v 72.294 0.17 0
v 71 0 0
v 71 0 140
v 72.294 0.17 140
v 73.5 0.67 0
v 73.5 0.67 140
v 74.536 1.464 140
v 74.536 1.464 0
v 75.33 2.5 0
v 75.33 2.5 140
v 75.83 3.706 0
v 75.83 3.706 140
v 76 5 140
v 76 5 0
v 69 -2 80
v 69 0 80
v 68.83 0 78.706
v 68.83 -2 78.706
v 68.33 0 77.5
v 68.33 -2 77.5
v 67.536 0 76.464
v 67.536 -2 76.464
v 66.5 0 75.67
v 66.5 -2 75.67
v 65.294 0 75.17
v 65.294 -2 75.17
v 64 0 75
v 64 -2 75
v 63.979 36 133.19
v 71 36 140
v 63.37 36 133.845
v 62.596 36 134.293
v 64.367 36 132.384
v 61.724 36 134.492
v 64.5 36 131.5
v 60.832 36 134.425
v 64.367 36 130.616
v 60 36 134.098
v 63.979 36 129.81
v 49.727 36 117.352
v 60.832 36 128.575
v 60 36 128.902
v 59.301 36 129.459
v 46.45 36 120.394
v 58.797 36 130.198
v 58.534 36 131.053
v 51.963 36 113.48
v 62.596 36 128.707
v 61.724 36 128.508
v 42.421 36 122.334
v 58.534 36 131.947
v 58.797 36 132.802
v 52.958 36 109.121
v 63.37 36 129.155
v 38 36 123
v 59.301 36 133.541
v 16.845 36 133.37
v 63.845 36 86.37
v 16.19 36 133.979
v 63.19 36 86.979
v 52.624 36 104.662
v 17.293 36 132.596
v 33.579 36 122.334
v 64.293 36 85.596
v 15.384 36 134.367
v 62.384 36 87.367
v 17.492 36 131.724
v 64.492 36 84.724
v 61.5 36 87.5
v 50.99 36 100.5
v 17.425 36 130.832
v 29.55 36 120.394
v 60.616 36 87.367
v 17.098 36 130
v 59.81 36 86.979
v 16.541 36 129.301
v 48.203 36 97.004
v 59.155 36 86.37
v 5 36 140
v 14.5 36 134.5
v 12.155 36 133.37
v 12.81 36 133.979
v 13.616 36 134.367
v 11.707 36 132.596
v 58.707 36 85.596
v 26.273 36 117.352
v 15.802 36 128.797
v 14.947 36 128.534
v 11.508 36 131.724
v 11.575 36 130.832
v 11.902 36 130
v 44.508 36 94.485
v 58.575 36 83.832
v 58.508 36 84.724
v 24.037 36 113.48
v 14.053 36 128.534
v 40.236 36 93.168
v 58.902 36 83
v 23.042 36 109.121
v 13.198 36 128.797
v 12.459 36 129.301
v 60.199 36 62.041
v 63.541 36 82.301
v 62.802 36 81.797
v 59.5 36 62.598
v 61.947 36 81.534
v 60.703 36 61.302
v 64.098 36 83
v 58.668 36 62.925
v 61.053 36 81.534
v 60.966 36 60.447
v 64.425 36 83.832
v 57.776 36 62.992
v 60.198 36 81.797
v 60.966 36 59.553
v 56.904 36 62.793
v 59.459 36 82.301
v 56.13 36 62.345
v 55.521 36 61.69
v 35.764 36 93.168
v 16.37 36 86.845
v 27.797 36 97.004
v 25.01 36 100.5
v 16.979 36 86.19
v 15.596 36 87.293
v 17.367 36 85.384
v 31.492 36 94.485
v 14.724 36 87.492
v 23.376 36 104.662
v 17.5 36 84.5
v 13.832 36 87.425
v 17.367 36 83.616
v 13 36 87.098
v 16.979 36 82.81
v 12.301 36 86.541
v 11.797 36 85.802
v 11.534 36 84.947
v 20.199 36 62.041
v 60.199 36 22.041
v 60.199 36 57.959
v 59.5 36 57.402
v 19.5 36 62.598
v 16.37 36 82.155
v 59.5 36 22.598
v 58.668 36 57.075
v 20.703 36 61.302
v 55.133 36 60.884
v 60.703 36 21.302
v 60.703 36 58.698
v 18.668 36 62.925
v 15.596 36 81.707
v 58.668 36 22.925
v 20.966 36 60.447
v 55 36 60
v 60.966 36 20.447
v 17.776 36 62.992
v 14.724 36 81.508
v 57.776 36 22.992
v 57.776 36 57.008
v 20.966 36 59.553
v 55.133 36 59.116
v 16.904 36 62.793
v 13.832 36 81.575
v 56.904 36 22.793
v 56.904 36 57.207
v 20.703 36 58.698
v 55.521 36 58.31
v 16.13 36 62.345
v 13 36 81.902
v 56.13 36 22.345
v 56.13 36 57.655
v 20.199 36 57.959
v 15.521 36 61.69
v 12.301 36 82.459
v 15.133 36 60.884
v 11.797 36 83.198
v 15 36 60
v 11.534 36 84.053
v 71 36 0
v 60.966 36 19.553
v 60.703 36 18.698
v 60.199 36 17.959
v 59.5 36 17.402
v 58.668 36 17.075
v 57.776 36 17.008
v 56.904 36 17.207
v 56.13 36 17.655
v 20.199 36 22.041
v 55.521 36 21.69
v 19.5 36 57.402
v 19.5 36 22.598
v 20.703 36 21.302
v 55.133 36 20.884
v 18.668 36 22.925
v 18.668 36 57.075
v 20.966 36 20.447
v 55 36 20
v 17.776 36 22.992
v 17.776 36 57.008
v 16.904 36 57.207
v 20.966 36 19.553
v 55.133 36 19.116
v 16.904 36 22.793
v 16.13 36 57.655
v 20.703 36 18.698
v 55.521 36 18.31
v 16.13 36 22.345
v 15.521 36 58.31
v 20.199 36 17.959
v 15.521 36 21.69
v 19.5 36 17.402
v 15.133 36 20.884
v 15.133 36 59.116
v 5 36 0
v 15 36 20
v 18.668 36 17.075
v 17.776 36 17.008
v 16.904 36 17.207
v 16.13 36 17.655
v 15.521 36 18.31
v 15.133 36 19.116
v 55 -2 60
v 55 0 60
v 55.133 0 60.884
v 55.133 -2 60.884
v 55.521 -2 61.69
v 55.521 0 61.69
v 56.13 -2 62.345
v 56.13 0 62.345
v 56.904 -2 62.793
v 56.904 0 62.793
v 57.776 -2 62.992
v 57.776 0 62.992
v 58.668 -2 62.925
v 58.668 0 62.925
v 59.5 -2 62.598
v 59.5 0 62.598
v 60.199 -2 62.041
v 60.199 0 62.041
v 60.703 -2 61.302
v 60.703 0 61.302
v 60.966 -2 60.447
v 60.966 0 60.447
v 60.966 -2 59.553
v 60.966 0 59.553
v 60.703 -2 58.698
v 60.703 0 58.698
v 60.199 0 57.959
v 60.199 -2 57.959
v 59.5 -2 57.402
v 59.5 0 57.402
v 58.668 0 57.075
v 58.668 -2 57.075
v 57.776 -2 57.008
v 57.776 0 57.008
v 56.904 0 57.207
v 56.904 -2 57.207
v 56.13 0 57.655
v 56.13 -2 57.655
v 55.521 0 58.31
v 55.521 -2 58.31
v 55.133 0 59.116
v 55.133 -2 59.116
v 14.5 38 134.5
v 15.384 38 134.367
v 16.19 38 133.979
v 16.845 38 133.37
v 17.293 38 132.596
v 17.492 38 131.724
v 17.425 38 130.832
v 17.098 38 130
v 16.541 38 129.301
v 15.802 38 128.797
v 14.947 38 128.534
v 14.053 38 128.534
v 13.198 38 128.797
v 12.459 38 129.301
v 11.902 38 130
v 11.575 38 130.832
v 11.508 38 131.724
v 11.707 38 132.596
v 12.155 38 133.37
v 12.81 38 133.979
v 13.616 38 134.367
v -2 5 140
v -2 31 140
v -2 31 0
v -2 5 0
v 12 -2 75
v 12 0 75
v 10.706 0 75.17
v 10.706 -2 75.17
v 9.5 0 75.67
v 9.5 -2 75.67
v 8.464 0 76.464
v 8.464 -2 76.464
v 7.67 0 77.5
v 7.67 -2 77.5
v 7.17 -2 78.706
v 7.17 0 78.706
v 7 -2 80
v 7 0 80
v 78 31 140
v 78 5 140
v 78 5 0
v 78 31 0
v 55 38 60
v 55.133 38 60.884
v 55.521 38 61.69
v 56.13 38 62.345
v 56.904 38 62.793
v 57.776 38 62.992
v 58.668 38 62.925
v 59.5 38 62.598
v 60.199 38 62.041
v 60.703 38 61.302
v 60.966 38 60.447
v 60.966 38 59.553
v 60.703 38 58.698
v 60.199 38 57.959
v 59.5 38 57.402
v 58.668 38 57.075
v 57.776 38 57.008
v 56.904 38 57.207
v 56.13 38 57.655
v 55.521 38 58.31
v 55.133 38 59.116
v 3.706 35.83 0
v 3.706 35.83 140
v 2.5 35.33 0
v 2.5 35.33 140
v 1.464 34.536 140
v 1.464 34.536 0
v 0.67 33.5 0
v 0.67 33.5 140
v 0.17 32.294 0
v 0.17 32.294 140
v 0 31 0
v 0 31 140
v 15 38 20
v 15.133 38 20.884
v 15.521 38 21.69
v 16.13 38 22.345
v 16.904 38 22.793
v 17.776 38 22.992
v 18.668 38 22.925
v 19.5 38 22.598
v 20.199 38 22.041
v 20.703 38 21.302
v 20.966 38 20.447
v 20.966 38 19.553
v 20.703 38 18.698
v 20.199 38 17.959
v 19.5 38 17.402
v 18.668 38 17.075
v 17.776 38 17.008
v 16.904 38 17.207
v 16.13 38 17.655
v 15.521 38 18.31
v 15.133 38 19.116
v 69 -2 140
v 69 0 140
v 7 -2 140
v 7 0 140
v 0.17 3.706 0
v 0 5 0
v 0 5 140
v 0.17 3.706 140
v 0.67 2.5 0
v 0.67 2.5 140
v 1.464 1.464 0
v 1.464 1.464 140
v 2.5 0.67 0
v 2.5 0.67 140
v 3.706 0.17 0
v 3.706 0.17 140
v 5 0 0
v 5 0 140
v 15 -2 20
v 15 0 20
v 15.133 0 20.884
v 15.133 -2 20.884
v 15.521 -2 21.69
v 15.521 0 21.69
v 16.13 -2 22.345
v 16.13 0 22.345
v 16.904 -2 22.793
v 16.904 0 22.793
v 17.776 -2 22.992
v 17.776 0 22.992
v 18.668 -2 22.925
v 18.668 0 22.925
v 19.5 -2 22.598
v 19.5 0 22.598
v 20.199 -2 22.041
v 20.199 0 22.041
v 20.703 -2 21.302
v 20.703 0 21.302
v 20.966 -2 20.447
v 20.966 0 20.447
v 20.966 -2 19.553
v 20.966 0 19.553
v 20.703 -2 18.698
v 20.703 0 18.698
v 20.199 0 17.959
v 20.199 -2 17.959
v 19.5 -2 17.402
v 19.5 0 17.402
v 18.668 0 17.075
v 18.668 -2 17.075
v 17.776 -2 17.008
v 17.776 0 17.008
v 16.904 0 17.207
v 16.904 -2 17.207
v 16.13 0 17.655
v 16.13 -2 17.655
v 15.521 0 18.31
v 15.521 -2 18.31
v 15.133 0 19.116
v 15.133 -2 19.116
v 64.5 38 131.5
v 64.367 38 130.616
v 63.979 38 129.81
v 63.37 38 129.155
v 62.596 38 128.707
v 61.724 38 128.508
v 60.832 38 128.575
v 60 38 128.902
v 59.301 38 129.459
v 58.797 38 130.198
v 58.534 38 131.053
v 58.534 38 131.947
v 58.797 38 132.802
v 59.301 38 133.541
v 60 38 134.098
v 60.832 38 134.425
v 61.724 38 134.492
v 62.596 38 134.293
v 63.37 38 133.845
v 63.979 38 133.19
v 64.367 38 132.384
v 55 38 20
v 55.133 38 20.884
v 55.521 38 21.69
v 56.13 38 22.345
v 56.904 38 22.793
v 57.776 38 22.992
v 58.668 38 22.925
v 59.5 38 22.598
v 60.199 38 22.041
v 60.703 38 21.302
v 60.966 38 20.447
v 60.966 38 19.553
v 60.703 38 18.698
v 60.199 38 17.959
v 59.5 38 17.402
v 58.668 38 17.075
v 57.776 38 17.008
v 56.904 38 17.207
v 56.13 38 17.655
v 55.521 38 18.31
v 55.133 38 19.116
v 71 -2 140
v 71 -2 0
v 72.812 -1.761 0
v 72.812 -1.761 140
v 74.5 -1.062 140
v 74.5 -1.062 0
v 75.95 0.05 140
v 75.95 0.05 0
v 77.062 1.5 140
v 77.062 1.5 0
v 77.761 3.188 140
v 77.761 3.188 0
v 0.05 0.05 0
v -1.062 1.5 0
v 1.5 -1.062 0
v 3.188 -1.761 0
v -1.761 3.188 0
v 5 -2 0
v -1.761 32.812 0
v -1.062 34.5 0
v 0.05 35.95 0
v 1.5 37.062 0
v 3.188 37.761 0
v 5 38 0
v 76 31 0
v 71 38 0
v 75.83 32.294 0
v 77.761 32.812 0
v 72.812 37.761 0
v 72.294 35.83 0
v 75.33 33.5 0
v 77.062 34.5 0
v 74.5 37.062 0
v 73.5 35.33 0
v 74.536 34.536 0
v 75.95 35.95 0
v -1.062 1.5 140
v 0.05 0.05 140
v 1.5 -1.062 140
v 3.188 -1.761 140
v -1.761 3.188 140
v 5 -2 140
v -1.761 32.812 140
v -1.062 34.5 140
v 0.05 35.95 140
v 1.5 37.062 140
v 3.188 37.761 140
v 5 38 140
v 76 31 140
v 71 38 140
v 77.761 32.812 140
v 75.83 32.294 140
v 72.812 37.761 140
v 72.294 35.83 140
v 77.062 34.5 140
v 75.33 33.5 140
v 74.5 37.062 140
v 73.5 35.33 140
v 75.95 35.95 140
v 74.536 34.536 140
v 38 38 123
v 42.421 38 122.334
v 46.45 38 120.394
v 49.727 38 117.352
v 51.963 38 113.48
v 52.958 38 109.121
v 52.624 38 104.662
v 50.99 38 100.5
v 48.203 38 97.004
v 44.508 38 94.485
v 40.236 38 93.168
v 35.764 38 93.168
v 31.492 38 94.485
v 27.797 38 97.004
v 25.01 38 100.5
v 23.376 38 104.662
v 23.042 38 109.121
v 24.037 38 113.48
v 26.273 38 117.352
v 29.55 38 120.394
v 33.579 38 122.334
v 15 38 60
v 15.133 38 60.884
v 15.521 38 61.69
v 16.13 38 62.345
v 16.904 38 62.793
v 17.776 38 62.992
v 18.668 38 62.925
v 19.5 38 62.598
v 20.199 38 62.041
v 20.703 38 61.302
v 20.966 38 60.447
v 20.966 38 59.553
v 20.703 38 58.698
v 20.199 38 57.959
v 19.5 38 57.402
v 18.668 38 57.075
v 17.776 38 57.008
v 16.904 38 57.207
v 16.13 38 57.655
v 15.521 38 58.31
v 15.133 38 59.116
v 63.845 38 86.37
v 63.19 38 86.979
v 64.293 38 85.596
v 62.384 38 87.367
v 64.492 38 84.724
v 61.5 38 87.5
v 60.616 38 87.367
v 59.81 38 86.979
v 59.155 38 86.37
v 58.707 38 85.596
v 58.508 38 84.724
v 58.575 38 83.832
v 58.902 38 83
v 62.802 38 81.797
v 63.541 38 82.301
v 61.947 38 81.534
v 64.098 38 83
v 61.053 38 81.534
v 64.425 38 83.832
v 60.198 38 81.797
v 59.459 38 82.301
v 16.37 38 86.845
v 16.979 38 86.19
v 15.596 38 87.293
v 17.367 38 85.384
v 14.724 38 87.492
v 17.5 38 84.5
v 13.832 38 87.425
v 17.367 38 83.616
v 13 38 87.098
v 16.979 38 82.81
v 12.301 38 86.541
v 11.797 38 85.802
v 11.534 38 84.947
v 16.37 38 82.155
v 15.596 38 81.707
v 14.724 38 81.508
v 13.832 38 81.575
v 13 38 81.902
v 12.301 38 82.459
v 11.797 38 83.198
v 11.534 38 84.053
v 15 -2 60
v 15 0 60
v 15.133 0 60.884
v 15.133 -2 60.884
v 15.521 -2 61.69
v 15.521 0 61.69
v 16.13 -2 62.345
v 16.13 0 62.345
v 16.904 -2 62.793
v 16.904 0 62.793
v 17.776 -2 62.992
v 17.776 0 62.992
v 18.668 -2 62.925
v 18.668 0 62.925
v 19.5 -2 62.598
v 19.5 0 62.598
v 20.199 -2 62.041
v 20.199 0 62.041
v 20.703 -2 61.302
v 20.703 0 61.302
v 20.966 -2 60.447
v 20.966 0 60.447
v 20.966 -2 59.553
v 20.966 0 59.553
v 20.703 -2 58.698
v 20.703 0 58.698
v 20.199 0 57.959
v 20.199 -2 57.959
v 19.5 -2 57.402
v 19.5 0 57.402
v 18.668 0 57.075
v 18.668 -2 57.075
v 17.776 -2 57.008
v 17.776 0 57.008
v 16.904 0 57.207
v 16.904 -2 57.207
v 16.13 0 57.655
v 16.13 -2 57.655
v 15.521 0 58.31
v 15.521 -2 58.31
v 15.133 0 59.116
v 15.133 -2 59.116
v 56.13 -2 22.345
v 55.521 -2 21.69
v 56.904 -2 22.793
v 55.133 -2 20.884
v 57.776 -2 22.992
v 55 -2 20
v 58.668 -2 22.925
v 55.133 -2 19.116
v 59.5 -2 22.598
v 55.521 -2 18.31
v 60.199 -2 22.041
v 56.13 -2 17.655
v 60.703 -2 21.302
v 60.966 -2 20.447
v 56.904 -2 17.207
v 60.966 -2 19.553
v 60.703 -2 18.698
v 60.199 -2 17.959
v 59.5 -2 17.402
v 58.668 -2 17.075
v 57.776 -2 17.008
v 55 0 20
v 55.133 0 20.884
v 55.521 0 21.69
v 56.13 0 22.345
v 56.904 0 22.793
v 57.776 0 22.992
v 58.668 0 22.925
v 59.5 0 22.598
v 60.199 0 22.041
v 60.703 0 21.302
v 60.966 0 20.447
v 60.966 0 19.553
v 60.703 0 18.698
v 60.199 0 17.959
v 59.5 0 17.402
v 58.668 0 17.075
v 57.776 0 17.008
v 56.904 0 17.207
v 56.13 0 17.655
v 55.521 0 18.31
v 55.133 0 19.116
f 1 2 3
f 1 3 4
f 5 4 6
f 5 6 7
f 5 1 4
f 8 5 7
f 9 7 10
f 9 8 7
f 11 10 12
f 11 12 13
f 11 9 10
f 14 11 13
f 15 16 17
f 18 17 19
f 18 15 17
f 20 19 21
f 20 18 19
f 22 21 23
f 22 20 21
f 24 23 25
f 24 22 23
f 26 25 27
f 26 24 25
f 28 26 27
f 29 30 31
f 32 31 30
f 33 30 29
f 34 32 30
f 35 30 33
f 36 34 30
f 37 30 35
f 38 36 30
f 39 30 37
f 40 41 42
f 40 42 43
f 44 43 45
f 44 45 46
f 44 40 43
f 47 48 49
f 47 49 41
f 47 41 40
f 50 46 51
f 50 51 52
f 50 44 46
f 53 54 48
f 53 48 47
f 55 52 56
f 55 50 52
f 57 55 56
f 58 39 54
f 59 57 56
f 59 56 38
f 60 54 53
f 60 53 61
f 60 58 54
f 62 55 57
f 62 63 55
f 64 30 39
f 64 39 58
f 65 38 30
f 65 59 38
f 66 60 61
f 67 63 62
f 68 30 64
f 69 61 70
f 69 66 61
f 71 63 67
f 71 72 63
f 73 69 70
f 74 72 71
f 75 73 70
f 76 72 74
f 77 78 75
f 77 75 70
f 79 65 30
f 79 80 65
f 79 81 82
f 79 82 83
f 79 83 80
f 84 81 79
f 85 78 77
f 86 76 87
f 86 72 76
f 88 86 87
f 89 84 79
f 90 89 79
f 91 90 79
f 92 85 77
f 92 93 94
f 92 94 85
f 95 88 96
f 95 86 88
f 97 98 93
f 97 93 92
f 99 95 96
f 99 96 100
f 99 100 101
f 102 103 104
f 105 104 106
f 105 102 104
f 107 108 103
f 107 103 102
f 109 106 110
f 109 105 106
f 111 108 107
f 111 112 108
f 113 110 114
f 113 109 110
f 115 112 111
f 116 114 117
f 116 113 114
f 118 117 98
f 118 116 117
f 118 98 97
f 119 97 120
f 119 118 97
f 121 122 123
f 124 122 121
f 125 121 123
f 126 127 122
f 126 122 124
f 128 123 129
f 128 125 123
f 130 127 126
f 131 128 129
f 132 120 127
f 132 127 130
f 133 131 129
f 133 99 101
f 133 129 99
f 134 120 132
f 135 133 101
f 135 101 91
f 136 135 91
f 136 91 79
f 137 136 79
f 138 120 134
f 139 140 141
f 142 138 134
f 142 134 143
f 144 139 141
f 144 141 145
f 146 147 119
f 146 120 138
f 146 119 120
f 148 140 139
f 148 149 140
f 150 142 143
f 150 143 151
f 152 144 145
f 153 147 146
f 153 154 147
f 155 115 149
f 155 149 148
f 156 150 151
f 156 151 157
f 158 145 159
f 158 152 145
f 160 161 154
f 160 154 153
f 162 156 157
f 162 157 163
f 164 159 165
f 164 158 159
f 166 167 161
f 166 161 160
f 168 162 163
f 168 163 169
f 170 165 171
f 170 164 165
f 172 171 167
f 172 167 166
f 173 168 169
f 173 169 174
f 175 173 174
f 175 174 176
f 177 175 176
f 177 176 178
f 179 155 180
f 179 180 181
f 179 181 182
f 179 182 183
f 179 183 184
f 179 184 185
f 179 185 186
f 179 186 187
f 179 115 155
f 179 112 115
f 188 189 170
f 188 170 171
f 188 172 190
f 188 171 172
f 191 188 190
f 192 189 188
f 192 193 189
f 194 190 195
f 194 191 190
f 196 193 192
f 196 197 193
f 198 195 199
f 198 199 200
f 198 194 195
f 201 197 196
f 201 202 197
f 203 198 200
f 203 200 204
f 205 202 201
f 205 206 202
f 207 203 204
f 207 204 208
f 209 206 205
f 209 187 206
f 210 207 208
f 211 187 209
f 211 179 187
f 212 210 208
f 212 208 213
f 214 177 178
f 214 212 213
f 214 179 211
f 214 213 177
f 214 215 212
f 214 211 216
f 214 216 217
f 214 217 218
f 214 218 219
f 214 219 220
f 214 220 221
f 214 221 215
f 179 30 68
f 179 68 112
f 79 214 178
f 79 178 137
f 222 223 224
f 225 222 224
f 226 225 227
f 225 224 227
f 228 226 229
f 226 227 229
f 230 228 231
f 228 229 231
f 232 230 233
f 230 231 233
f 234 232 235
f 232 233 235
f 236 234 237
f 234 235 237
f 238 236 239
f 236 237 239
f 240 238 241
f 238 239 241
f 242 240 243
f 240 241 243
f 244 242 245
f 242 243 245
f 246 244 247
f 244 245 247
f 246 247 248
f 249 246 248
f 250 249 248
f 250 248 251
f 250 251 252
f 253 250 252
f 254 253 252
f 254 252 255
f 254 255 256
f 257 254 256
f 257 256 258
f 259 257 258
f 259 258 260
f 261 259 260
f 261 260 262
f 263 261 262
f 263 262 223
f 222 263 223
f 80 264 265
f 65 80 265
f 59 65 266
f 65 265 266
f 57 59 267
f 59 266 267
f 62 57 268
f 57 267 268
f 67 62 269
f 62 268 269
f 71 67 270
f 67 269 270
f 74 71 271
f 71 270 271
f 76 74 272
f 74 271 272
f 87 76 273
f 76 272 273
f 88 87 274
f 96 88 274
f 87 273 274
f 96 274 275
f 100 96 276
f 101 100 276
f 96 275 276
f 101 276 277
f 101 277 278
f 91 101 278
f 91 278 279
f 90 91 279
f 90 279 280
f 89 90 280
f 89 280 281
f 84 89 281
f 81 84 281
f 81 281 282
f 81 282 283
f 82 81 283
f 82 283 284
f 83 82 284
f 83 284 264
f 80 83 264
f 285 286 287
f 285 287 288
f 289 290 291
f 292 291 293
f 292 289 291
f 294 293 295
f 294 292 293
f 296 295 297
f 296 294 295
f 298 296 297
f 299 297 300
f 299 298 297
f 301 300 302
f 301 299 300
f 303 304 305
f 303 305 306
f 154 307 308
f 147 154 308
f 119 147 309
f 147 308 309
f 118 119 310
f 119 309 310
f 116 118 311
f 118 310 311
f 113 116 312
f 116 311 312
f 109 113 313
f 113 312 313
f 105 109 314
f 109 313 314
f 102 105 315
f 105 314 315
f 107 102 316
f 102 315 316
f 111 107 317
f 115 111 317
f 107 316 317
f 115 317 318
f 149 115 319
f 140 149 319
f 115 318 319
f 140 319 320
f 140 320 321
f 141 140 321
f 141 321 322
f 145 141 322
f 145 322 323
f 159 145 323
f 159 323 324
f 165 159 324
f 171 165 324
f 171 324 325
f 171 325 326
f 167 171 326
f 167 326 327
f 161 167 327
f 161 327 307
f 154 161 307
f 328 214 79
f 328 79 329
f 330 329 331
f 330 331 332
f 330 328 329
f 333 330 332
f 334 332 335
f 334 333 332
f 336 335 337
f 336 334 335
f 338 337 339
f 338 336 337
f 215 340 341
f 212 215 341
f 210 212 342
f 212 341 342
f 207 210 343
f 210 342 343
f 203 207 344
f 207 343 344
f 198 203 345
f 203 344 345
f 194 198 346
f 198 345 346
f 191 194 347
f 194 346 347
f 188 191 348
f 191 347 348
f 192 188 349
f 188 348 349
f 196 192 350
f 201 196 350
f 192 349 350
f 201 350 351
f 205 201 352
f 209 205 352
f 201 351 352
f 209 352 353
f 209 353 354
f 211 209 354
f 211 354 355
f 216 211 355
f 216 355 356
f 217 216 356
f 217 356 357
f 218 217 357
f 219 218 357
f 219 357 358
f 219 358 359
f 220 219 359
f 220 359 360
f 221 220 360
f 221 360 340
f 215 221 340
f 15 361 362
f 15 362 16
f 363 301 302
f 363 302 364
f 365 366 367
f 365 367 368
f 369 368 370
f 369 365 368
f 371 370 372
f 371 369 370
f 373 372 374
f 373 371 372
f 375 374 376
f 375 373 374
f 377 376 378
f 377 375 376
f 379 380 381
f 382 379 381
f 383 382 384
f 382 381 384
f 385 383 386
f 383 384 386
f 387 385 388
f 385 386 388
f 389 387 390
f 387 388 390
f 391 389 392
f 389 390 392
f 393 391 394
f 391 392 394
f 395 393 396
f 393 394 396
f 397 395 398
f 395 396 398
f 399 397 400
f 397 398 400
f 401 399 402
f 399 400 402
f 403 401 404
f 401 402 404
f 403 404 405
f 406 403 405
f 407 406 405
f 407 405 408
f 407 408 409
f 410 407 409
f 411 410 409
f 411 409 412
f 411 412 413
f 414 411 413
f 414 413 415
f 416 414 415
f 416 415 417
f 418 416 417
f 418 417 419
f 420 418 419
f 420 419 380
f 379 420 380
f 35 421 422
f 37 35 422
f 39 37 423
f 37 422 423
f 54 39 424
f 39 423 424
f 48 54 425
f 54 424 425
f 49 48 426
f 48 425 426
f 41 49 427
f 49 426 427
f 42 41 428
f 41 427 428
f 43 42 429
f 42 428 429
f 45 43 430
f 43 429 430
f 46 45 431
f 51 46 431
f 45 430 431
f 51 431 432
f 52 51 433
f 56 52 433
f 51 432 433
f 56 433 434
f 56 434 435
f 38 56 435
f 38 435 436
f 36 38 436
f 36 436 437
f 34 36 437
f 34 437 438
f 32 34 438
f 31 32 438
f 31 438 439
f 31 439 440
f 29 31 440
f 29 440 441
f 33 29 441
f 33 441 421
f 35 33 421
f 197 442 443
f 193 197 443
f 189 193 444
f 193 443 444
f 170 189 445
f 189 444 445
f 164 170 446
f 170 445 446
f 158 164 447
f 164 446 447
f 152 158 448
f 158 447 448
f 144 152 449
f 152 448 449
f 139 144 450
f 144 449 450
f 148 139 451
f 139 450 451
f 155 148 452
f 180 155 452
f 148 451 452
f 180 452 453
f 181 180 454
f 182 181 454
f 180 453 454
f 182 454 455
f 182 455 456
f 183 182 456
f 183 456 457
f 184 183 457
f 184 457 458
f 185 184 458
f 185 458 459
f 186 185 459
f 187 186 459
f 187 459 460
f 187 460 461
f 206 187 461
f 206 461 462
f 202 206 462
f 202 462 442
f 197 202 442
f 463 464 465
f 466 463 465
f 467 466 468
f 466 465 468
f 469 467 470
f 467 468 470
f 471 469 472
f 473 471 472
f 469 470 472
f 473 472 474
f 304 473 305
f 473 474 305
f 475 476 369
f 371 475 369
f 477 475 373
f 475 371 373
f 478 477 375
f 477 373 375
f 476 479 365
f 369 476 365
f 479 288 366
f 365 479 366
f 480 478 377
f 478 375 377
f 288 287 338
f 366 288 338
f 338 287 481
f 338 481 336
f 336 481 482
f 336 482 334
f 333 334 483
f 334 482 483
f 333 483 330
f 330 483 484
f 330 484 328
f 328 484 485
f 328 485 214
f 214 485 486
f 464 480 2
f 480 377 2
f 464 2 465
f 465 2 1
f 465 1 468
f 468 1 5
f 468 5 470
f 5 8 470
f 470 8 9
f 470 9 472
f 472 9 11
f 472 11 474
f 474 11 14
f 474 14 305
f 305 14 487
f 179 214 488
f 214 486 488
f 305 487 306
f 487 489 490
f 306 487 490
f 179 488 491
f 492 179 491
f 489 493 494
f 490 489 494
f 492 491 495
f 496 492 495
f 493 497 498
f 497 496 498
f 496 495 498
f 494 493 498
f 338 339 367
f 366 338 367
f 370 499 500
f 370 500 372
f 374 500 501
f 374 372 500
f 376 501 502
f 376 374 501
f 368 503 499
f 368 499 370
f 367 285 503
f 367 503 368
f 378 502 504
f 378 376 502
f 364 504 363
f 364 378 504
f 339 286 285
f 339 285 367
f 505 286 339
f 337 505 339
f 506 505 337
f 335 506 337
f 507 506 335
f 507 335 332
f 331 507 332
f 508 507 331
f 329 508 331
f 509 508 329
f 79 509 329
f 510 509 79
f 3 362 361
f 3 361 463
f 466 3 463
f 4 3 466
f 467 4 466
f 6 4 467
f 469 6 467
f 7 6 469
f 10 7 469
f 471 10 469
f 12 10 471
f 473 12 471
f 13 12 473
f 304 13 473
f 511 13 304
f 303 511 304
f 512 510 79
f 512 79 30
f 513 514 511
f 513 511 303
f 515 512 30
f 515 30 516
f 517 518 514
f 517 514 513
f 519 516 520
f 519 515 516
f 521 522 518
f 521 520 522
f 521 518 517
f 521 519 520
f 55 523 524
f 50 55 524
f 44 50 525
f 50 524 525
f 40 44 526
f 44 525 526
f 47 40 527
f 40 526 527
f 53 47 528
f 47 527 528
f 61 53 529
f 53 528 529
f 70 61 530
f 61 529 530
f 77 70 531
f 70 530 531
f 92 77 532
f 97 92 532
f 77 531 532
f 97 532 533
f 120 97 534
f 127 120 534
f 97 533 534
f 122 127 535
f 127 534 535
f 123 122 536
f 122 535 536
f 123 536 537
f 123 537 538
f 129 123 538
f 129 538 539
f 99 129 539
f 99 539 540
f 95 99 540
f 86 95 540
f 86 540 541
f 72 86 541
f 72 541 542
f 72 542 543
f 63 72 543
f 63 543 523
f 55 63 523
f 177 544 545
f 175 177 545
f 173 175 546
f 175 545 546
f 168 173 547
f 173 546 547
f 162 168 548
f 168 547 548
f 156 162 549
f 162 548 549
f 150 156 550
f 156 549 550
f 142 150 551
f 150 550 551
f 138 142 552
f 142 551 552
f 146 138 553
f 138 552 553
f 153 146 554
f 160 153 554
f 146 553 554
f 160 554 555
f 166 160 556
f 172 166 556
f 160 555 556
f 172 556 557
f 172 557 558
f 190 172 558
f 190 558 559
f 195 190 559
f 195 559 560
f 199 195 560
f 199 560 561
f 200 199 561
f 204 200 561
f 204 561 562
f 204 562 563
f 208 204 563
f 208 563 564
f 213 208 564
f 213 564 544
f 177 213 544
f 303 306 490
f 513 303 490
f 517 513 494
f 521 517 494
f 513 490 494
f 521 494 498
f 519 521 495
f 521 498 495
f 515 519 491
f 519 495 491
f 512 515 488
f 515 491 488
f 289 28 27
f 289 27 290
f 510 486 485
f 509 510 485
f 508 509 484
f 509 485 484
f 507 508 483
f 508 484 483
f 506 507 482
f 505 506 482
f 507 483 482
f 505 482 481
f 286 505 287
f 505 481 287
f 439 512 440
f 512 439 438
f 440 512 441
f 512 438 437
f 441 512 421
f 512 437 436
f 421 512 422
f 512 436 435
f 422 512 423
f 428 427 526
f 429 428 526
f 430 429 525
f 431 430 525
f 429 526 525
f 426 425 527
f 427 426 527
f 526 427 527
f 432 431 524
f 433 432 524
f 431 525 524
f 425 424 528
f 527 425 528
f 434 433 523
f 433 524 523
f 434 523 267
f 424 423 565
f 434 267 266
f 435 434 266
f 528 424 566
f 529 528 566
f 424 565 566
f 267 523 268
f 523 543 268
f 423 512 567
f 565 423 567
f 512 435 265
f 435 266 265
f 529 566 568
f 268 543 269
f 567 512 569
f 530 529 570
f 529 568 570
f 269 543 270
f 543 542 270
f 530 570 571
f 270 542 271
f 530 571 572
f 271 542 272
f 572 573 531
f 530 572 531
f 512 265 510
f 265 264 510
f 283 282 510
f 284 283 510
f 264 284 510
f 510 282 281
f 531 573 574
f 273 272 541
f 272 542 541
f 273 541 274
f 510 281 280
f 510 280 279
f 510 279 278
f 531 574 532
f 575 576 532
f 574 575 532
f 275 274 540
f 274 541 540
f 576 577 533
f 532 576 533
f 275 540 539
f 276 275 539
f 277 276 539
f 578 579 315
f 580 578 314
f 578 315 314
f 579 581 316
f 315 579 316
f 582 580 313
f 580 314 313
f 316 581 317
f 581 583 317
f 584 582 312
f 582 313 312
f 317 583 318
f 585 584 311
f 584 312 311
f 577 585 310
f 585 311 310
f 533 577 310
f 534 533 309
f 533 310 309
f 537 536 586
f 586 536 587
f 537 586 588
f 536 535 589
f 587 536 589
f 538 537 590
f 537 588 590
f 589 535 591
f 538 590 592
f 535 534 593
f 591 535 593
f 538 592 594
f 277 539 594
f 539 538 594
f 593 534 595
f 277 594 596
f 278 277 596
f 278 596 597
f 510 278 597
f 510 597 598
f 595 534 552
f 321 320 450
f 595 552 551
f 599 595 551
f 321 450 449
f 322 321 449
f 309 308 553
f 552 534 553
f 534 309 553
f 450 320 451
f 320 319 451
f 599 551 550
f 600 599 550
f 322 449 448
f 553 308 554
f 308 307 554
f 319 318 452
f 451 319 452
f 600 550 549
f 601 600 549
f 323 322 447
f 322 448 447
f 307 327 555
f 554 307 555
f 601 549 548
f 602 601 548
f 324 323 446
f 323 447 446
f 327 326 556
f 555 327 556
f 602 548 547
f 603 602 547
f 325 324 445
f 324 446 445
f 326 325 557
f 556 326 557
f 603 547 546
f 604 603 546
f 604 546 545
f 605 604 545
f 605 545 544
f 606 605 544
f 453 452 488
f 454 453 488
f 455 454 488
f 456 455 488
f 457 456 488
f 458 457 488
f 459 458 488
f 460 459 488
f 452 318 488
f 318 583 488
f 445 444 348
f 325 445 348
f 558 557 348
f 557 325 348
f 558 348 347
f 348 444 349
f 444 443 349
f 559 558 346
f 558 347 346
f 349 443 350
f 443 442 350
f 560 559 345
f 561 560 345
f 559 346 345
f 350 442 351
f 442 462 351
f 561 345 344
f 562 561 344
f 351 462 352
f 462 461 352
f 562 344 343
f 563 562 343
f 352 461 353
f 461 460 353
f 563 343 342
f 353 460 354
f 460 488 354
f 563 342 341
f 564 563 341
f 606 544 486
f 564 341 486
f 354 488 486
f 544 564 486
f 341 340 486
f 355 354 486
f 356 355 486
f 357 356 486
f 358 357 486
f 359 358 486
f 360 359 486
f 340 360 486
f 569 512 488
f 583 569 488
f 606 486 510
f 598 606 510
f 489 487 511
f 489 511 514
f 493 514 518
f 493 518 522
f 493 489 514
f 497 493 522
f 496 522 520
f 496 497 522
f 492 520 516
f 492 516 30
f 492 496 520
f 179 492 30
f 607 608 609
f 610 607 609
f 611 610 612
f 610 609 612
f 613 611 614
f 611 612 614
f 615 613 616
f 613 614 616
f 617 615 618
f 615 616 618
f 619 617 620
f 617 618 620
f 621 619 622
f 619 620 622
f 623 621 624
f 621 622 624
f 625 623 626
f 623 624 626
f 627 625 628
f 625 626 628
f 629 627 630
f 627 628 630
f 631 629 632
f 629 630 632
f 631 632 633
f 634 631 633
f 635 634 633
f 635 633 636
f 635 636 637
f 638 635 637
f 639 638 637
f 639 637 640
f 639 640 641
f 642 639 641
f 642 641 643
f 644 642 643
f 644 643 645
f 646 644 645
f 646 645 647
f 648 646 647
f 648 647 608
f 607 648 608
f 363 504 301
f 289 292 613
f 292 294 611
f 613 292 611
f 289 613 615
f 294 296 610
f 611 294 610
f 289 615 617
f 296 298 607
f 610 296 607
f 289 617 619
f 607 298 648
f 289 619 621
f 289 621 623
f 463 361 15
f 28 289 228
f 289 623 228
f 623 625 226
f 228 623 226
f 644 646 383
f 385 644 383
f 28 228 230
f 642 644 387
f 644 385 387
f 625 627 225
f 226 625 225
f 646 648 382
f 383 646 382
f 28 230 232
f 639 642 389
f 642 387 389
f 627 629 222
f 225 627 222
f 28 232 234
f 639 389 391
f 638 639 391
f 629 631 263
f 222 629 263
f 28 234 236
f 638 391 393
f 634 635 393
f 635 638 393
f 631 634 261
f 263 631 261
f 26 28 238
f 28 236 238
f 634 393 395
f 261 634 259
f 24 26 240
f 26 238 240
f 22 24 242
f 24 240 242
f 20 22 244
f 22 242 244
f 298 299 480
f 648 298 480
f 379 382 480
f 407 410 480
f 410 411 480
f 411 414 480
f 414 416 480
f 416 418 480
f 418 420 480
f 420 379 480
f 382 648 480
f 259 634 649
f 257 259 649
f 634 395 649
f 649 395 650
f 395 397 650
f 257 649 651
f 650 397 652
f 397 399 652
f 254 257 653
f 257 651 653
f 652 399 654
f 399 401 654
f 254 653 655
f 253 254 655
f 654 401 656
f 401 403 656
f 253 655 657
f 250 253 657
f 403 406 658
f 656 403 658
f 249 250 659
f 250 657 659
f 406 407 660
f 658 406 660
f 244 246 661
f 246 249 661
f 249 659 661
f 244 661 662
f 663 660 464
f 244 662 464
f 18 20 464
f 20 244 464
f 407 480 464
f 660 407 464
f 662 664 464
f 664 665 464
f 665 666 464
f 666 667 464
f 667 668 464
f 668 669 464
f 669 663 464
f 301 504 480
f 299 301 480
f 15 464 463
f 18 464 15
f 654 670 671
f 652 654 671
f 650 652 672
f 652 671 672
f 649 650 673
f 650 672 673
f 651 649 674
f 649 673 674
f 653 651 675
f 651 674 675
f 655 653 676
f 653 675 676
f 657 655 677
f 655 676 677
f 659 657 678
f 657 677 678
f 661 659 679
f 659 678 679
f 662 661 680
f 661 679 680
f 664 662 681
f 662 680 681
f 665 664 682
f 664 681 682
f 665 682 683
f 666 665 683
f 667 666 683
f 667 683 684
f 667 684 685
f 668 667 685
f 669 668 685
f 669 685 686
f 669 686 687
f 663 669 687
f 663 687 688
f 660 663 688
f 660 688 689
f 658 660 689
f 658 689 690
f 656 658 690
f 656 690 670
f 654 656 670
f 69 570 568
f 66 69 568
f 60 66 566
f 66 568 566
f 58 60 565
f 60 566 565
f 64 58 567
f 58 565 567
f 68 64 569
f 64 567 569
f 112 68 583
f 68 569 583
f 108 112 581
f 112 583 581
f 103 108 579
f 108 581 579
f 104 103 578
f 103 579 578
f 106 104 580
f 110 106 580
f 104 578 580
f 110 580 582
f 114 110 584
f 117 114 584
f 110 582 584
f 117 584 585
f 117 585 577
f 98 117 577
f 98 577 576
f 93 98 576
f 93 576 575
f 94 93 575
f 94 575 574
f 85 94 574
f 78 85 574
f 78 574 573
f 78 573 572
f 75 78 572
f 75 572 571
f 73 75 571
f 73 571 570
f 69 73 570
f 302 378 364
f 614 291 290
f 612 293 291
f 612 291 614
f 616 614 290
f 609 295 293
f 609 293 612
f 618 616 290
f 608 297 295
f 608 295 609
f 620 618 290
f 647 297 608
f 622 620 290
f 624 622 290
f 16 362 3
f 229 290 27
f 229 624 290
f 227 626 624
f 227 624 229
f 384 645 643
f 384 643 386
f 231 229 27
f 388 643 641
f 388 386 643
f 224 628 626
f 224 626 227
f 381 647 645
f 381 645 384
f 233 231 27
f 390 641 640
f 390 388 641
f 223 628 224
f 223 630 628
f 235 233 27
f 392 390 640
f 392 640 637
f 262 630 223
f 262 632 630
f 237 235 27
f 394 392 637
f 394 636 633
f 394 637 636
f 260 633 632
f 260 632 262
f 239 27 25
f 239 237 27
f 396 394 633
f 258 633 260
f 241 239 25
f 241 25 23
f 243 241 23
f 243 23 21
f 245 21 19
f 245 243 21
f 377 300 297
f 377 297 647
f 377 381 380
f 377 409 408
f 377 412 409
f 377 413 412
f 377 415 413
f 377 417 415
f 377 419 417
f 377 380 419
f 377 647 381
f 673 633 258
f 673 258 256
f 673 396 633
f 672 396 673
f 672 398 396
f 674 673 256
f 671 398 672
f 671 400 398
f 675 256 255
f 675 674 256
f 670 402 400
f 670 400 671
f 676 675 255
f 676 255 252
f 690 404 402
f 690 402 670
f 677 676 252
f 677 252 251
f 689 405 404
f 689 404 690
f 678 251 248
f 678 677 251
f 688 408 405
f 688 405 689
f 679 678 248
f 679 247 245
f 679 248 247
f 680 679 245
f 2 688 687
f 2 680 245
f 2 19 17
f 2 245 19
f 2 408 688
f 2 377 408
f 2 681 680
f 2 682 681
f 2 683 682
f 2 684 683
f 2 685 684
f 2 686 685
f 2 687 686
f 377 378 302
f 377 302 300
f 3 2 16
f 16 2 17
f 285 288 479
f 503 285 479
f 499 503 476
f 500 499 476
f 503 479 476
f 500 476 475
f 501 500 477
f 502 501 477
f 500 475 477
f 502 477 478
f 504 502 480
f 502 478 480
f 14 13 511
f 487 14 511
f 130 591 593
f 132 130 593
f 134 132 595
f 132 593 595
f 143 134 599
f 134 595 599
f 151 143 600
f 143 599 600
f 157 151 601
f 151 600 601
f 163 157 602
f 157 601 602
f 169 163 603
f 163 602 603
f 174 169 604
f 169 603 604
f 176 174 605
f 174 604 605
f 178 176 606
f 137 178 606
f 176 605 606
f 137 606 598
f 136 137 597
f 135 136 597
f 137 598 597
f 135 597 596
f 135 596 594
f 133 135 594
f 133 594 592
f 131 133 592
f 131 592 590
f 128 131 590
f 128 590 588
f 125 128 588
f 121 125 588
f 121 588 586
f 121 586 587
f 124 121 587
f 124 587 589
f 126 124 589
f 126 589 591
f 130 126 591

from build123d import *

# Parameters (mm, degrees)
AUFSATZ_LINEAR_AUSTRAGEN1_DEPTH = 140
SKIZZE2_R                       = 15
SCHNITT_LINEAR_AUSTRAGEN1_DEPTH = 10
SCHNITT_LINEAR_AUSTRAGEN2_DEPTH = 10
SKIZZE4_R                       = 3
SCHNITT_LINEAR_AUSTRAGEN3_DEPTH = 10
SKIZZE5_R                       = 3
SCHNITT_LINEAR_AUSTRAGEN4_DEPTH = 60


with BuildPart() as part:
    # Skizze1 → Aufsatz-Linear austragen1 (new body)
    with BuildSketch(Plane.XY):
        with BuildLine():
            Line((78, 5), (78, 31))
            ThreePointArc((78, 31), (75.949747468, 35.949747468), (71, 38))
            Line((71, 38), (5, 38))
            ThreePointArc((5, 38), (0.050252532, 35.949747468), (-2, 31))
            Line((-2, 31), (-2, 5))
            ThreePointArc((-2, 5), (0.050252532, 0.050252532), (5, -2))
            Line((5, -2), (71, -2))
            ThreePointArc((71, -2), (75.949747468, 0.050252532), (78, 5))
        make_face()
        with BuildLine():
            Line((0, 31), (0, 5))
            ThreePointArc((0, 5), (1.464466094, 1.464466094), (5, 0))
            Line((5, 0), (71, 0))
            ThreePointArc((71, 0), (74.535533906, 1.464466094), (76, 5))
            Line((76, 5), (76, 31))
            ThreePointArc((76, 31), (74.535533906, 34.535533906), (71, 36))
            Line((71, 36), (5, 36))
            ThreePointArc((5, 36), (1.464466094, 34.535533906), (0, 31))
        make_face(mode=Mode.SUBTRACT)
    extrude(amount=AUFSATZ_LINEAR_AUSTRAGEN1_DEPTH)

    # Skizze2 → Schnitt-Linear austragen1 (cut)
    with BuildSketch(Plane(origin=(0, 38, 0), x_dir=(-1, 0, 0), z_dir=(0, 1, 0))):
        with Locations(Location((-38, 108, 0), (0, 0, 90))):
            Circle(SKIZZE2_R)
    extrude(amount=-SCHNITT_LINEAR_AUSTRAGEN1_DEPTH, mode=Mode.SUBTRACT)

    # Skizze3 → Schnitt-Linear austragen2 (cut)
    with BuildSketch(Plane.XZ.offset(2)):
        with BuildLine():
            Line((7, 140), (69, 140))
            Line((69, 140), (69, 80))
            ThreePointArc((69, 80), (67.535533906, 76.464466094), (64, 75))
            Line((64, 75), (12, 75))
            ThreePointArc((12, 75), (8.464466094, 76.464466094), (7, 80))
            Line((7, 80), (7, 140))
        make_face()
    extrude(amount=-SCHNITT_LINEAR_AUSTRAGEN2_DEPTH, mode=Mode.SUBTRACT)

    # Skizze4 → Schnitt-Linear austragen3 (cut)
    with BuildSketch(Plane(origin=(0, 38, 0), x_dir=(1, 0, 0), z_dir=(0, 1, 0))):
        with Locations(Location((61.5, -84.5, 0), (0, 0, 270))):
            Circle(SKIZZE4_R)
        with Locations((14.5, -84.5)):
            Circle(SKIZZE4_R)
        with Locations(Location((14.5, -131.5, 0), (0, 0, 270))):
            Circle(SKIZZE4_R)
        with Locations((61.5, -131.5)):
            Circle(SKIZZE4_R)
    extrude(amount=-SCHNITT_LINEAR_AUSTRAGEN3_DEPTH, mode=Mode.SUBTRACT)

    # Skizze5 → Schnitt-Linear austragen4 (cut)
    with BuildSketch(Plane(origin=(0, 38, 0), x_dir=(1, 0, 0), z_dir=(0, 1, 0))):
        with Locations(Location((58, -20, 0), (0, 0, 180))):
            Circle(SKIZZE5_R)
        with Locations(Location((18, -20, 0), (0, 0, 180))):
            Circle(SKIZZE5_R)
        with Locations(Location((58, -60, 0), (0, 0, 180))):
            Circle(SKIZZE5_R)
        with Locations(Location((18, -60, 0), (0, 0, 180))):
            Circle(SKIZZE5_R)
    extrude(amount=-SCHNITT_LINEAR_AUSTRAGEN4_DEPTH, mode=Mode.SUBTRACT)


solid = part.part
